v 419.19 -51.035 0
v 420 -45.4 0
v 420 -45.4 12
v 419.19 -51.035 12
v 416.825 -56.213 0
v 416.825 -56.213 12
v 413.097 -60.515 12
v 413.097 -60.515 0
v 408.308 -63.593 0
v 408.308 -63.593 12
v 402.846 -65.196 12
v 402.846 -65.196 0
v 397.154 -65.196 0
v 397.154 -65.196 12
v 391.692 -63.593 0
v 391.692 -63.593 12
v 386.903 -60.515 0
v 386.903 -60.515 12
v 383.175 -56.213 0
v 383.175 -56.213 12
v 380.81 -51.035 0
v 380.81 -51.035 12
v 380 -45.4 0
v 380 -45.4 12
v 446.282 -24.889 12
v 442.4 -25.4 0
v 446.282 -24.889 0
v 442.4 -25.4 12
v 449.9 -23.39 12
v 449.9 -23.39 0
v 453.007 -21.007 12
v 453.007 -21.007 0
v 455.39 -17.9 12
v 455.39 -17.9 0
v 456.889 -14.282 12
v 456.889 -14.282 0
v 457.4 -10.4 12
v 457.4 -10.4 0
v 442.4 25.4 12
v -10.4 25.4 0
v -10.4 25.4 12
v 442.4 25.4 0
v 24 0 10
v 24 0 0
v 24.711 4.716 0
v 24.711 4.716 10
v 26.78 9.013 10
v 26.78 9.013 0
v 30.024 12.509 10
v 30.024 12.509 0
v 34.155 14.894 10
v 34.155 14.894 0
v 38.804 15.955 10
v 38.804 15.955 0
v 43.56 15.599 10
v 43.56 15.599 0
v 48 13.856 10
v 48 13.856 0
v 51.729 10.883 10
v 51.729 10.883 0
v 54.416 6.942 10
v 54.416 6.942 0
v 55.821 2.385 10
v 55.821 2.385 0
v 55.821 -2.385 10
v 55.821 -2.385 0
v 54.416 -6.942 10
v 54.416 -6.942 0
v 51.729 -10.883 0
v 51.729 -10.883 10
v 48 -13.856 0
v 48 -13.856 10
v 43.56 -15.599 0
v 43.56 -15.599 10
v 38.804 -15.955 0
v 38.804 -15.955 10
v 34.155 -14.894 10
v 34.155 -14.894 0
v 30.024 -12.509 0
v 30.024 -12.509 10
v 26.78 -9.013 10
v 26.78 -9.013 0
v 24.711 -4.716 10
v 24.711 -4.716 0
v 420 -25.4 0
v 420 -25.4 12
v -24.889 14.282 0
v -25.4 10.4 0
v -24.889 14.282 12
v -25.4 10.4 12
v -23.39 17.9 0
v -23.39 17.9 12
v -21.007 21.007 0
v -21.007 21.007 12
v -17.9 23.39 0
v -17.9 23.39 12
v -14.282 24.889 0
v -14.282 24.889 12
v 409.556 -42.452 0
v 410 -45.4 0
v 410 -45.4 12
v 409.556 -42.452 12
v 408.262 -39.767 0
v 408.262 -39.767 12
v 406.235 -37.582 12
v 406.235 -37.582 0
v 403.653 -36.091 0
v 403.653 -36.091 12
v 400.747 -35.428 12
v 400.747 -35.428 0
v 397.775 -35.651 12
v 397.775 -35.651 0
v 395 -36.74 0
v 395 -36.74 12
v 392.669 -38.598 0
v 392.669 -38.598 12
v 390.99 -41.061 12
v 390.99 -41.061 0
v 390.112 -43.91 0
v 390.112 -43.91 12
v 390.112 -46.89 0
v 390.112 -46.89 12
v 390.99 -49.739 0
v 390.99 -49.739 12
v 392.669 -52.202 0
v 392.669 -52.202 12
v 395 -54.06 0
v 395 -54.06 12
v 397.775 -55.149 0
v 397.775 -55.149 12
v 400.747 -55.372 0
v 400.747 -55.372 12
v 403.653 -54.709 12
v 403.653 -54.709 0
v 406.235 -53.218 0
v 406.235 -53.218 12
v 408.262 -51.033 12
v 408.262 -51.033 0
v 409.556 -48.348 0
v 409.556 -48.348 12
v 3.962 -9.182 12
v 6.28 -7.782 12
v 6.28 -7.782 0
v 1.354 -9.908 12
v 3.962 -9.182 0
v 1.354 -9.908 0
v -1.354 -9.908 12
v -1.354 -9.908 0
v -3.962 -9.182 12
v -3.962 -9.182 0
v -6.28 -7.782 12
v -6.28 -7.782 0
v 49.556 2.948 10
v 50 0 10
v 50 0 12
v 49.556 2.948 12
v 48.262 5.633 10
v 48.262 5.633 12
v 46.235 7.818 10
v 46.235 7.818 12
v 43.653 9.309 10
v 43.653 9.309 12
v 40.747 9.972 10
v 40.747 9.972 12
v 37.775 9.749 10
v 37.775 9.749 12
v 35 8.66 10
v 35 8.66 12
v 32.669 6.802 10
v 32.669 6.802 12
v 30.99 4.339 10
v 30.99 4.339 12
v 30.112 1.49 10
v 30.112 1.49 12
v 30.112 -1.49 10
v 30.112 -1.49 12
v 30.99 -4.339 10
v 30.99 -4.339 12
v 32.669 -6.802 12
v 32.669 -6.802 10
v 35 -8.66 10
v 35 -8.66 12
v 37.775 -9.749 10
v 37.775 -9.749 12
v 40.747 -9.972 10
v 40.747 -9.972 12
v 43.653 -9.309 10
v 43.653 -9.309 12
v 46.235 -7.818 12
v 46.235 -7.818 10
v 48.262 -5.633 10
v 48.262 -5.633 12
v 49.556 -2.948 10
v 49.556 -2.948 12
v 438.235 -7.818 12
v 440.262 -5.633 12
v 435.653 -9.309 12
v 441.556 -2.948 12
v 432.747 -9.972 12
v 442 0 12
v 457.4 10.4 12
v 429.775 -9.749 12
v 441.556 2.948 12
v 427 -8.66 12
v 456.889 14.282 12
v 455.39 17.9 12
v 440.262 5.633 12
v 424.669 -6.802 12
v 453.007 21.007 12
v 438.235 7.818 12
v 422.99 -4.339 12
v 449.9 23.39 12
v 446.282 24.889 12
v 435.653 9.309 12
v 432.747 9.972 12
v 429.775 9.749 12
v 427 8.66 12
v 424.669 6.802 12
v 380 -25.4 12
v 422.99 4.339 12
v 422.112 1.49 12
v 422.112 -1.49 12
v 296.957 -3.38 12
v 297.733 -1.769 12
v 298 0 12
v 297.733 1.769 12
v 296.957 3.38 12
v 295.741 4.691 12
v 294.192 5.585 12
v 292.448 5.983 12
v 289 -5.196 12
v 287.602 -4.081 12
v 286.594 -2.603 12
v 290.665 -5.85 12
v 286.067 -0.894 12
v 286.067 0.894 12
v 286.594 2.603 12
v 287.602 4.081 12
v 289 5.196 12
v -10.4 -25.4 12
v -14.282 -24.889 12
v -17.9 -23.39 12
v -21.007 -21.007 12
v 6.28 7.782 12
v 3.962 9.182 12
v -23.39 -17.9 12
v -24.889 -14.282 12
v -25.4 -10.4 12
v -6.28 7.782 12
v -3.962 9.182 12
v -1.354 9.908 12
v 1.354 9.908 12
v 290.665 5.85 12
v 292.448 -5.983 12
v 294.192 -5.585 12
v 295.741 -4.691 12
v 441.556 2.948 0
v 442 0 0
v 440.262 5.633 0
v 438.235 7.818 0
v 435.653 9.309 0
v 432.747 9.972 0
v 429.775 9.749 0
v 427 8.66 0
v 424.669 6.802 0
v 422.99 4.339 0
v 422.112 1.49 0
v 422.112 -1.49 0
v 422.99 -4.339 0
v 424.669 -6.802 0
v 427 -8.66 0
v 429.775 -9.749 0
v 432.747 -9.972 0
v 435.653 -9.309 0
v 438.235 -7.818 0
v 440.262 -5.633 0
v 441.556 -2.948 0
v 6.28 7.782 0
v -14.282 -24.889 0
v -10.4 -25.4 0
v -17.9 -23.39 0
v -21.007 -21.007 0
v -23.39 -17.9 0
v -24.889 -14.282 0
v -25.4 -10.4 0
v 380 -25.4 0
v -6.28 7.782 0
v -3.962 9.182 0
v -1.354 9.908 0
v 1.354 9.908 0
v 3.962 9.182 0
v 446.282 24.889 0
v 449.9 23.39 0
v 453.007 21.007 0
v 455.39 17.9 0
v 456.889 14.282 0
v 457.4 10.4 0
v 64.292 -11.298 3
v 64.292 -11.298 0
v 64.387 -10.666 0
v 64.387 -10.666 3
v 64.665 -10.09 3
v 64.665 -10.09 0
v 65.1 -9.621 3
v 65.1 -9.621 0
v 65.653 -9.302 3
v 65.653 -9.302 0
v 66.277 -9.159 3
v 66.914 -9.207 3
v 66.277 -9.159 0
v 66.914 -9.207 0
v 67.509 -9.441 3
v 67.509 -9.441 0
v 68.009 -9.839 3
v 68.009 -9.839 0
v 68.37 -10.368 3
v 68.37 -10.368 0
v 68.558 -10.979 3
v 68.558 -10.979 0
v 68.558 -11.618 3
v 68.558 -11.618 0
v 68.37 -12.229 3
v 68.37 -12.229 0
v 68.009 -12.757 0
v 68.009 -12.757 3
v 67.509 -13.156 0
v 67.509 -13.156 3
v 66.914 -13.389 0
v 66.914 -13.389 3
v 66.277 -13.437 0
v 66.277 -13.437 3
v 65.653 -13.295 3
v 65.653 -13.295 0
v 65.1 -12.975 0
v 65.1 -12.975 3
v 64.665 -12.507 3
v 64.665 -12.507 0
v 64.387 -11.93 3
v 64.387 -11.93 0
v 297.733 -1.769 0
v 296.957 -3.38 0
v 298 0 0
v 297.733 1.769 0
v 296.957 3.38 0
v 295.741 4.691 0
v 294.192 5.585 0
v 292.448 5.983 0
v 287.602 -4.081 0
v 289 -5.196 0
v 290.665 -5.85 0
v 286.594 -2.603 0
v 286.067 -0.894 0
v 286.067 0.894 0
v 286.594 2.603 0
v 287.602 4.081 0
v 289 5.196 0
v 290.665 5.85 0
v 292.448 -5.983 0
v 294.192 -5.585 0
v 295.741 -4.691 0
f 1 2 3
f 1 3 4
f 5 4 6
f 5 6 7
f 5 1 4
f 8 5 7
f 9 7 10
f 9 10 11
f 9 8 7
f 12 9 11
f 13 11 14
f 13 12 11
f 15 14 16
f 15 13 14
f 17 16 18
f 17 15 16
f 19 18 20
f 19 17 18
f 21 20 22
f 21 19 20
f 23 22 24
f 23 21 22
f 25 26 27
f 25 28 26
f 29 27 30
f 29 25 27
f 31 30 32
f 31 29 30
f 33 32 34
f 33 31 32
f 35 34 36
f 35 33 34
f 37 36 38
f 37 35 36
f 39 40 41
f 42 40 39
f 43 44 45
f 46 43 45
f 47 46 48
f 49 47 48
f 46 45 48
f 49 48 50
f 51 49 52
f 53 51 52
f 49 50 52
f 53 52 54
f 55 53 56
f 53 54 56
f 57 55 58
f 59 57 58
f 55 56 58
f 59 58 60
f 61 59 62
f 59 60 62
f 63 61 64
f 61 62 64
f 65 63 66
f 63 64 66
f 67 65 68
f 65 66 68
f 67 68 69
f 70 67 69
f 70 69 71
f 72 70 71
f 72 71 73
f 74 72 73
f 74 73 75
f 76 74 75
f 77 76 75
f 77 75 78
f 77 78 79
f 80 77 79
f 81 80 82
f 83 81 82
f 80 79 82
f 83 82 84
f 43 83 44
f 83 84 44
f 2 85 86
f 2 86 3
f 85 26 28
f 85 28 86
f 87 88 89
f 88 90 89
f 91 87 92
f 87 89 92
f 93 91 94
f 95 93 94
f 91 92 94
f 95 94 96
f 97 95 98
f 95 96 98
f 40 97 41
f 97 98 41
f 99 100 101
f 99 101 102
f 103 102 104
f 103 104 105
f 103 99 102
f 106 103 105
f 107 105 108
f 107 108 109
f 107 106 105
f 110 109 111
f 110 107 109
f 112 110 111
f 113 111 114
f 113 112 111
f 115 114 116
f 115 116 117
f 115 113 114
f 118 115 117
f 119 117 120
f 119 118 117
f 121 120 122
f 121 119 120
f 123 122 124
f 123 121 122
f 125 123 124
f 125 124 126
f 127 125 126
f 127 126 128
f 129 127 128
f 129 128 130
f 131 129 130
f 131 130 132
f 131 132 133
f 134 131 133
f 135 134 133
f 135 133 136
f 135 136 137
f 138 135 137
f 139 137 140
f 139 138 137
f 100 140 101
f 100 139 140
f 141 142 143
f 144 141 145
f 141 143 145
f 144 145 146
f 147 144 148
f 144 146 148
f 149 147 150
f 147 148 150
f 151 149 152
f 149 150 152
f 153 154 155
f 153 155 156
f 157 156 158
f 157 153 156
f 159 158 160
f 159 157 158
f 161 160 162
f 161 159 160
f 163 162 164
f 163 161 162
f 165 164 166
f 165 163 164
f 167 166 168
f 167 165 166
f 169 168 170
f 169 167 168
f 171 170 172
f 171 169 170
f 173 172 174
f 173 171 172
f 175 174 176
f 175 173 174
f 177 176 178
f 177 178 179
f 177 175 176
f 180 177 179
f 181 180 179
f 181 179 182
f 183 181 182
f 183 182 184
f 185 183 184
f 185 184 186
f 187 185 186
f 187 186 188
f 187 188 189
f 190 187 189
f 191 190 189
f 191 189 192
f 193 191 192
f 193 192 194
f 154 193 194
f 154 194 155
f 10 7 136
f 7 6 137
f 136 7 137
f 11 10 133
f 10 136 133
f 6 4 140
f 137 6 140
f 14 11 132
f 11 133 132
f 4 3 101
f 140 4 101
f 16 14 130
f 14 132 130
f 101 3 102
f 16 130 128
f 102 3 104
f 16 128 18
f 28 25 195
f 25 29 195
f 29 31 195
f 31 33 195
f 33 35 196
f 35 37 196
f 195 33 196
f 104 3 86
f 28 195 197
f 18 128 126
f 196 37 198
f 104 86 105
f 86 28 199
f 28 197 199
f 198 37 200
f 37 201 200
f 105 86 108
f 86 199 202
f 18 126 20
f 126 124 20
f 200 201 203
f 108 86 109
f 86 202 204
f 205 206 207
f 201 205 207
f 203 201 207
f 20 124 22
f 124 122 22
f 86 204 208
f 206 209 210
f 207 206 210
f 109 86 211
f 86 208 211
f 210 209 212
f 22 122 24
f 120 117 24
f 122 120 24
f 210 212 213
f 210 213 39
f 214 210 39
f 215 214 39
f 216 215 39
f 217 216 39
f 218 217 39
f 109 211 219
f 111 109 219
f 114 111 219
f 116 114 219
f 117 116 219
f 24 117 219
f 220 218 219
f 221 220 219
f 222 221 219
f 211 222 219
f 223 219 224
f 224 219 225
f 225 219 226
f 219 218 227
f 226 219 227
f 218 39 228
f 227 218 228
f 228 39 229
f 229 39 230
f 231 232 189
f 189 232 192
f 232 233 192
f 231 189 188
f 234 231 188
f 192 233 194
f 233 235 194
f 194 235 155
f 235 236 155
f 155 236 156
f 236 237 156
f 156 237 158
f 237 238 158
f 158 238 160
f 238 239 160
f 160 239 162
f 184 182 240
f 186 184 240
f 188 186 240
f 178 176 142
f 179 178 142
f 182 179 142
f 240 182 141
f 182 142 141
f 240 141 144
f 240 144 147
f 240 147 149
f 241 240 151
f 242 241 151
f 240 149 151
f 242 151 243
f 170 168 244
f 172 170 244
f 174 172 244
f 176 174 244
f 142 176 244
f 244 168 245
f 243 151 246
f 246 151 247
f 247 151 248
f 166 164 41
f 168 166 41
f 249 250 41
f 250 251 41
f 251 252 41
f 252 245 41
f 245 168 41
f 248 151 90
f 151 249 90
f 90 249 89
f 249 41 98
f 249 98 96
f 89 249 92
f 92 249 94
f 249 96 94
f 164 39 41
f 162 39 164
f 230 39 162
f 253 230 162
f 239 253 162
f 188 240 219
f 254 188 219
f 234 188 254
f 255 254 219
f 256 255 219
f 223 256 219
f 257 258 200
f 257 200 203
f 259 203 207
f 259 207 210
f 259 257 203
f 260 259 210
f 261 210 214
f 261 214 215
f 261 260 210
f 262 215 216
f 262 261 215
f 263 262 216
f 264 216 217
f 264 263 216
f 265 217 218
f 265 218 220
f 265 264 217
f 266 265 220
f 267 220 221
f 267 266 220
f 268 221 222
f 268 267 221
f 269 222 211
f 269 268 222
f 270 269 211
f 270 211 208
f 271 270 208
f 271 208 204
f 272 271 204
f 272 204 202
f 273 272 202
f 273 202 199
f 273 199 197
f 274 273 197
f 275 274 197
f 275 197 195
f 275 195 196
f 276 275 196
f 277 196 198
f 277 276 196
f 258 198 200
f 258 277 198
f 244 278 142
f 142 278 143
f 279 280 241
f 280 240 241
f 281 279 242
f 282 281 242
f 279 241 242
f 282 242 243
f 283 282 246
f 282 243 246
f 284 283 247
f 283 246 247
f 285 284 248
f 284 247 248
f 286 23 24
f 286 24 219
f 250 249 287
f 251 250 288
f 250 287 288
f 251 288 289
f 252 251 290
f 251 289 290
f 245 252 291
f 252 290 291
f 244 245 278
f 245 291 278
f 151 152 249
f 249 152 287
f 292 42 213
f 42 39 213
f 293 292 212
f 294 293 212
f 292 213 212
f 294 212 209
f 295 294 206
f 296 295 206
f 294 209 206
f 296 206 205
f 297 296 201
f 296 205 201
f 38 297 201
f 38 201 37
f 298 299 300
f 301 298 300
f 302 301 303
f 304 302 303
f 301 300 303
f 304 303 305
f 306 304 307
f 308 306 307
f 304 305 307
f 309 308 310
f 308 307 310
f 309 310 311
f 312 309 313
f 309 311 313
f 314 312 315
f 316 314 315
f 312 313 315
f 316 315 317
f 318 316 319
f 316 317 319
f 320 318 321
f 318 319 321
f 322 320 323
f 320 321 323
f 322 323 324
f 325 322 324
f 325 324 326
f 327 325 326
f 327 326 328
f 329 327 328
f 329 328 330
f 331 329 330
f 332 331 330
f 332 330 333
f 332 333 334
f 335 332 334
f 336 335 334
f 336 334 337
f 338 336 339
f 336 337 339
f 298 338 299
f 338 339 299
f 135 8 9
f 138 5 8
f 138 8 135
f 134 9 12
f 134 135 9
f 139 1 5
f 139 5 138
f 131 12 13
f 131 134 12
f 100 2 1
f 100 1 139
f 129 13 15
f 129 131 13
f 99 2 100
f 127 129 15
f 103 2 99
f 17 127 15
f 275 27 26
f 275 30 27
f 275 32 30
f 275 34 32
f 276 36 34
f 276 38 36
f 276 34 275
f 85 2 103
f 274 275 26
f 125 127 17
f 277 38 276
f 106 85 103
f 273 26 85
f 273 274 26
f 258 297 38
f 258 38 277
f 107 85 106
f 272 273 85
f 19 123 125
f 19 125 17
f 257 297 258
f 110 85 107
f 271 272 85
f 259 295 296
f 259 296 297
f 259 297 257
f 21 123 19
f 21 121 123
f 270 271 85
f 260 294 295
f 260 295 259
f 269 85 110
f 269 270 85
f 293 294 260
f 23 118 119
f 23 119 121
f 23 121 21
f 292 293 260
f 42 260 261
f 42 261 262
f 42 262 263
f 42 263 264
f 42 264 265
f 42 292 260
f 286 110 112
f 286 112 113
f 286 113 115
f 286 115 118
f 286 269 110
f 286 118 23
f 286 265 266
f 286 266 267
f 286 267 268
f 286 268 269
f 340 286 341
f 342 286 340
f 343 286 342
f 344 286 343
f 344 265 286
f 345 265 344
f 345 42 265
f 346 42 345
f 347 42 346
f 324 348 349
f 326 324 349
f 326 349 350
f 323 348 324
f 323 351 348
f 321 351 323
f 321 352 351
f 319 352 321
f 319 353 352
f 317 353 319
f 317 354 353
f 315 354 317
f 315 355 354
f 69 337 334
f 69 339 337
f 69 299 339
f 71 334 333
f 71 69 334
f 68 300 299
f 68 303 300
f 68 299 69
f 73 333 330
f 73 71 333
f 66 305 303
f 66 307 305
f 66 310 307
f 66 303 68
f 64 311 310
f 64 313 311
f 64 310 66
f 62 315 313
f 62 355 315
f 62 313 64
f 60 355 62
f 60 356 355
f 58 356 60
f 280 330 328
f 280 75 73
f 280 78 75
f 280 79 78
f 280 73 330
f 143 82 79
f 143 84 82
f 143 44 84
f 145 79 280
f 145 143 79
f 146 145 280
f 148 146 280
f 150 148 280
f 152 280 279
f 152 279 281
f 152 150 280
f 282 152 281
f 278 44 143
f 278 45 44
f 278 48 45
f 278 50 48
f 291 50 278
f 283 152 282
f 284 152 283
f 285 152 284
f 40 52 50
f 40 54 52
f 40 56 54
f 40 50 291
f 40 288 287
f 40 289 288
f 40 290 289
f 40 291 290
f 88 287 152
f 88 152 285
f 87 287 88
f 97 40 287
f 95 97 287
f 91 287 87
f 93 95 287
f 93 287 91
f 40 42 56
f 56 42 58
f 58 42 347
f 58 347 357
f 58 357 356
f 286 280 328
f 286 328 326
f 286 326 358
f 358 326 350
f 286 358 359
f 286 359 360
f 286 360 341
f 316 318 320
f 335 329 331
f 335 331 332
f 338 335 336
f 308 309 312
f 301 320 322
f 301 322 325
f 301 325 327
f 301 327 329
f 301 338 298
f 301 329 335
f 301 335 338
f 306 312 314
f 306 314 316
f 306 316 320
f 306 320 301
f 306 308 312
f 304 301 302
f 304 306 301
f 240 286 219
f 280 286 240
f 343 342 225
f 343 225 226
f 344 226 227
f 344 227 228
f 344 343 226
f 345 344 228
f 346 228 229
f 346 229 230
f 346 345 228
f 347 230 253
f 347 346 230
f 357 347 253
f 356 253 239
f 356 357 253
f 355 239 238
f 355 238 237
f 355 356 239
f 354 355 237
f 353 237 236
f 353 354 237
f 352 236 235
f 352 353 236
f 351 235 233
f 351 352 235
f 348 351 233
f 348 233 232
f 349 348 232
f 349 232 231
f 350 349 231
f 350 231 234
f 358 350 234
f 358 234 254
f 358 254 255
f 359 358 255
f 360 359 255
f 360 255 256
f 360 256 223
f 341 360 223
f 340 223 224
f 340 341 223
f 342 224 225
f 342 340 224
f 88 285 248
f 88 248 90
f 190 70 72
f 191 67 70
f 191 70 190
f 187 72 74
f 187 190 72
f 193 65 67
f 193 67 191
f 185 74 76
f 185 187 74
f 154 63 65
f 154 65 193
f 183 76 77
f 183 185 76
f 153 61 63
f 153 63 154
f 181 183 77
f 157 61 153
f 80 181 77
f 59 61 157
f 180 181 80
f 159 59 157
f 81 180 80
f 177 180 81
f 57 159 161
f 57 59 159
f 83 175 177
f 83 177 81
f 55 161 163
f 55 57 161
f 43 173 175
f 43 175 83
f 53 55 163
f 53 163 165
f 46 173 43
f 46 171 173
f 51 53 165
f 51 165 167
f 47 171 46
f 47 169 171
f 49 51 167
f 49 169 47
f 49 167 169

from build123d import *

# Parameters (mm, degrees)
CROQUIS1_R              = 10
CROQUIS1_R_2            = 6
SALIENTE_EXTRUIR1_DEPTH = 12
CROQUIS2_R              = 2.144956207
CORTAR_EXTRUIR1_DEPTH   = 3
CROQUIS3_R              = 16
CORTAR_EXTRUIR2_DEPTH   = 10
REDONDEO1_R             = 15
REDONDEO2_R             = 15


with BuildPart() as part:
    # Croquis1 → Saliente-Extruir1 (new body)
    with BuildSketch(Plane.XY):
        with BuildLine():
            Line((380, -45.4), (380, -25.4))
            Line((380, -25.4), (-25.4, -25.4))
            Line((-25.4, -25.4), (-25.4, 25.4))
            Line((-25.4, 25.4), (457.4, 25.4))
            Line((457.4, 25.4), (457.4, -25.4))
            Line((457.4, -25.4), (420, -25.4))
            Line((420, -25.4), (420, -45.4))
            ThreePointArc((420, -45.4), (400, -65.4), (380, -45.4))
        make_face()
        with Locations((432, 0)):
            Circle(CROQUIS1_R, mode=Mode.SUBTRACT)
        with Locations((40, 0)):
            Circle(CROQUIS1_R, mode=Mode.SUBTRACT)
        with Locations((292, 0)):
            Circle(CROQUIS1_R_2, mode=Mode.SUBTRACT)
        with Locations((400, -45.4)):
            Circle(CROQUIS1_R, mode=Mode.SUBTRACT)
        with BuildLine():
            Line((-6.28, -7.782133384), (-6.28, 7.782133384))
            ThreePointArc((-6.28, 7.782133384), (0, 10), (6.28, 7.782133384))
            Line((6.28, 7.782133384), (6.28, -7.782133384))
            ThreePointArc((6.28, -7.782133384), (0, -10), (-6.28, -7.782133384))
        make_face(mode=Mode.SUBTRACT)
    extrude(amount=SALIENTE_EXTRUIR1_DEPTH)

    # Croquis2 → Cortar-Extruir1 (cut)
    with BuildSketch(Plane(origin=(0, 0, 0), x_dir=(-1, 0, 0), z_dir=(0, 0, -1))):
        with Locations((-66.437001332, -11.298220954)):
            Circle(CROQUIS2_R)
    extrude(amount=-CORTAR_EXTRUIR1_DEPTH, mode=Mode.SUBTRACT)

    # Croquis3 → Cortar-Extruir2 (cut)
    with BuildSketch(Plane(origin=(0, 0, 0), x_dir=(-1, 0, 0), z_dir=(0, 0, -1))):
        with Locations((-40, 0)):
            Circle(CROQUIS3_R)
    extrude(amount=-CORTAR_EXTRUIR2_DEPTH, mode=Mode.SUBTRACT)

    # Redondeo1
    redondeo1_edges = [part.edges().sort_by_distance(p)[0] for p in [
        (-25.4, 25.4, 6),
        (-25.4, -25.4, 6),
    ]]
    fillet(redondeo1_edges, radius=REDONDEO1_R)

    # Redondeo2
    redondeo2_edges = [part.edges().sort_by_distance(p)[0] for p in [
        (457.4, 25.4, 6),
        (457.4, -25.4, 6),
    ]]
    fillet(redondeo2_edges, radius=REDONDEO2_R)


solid = part.part
